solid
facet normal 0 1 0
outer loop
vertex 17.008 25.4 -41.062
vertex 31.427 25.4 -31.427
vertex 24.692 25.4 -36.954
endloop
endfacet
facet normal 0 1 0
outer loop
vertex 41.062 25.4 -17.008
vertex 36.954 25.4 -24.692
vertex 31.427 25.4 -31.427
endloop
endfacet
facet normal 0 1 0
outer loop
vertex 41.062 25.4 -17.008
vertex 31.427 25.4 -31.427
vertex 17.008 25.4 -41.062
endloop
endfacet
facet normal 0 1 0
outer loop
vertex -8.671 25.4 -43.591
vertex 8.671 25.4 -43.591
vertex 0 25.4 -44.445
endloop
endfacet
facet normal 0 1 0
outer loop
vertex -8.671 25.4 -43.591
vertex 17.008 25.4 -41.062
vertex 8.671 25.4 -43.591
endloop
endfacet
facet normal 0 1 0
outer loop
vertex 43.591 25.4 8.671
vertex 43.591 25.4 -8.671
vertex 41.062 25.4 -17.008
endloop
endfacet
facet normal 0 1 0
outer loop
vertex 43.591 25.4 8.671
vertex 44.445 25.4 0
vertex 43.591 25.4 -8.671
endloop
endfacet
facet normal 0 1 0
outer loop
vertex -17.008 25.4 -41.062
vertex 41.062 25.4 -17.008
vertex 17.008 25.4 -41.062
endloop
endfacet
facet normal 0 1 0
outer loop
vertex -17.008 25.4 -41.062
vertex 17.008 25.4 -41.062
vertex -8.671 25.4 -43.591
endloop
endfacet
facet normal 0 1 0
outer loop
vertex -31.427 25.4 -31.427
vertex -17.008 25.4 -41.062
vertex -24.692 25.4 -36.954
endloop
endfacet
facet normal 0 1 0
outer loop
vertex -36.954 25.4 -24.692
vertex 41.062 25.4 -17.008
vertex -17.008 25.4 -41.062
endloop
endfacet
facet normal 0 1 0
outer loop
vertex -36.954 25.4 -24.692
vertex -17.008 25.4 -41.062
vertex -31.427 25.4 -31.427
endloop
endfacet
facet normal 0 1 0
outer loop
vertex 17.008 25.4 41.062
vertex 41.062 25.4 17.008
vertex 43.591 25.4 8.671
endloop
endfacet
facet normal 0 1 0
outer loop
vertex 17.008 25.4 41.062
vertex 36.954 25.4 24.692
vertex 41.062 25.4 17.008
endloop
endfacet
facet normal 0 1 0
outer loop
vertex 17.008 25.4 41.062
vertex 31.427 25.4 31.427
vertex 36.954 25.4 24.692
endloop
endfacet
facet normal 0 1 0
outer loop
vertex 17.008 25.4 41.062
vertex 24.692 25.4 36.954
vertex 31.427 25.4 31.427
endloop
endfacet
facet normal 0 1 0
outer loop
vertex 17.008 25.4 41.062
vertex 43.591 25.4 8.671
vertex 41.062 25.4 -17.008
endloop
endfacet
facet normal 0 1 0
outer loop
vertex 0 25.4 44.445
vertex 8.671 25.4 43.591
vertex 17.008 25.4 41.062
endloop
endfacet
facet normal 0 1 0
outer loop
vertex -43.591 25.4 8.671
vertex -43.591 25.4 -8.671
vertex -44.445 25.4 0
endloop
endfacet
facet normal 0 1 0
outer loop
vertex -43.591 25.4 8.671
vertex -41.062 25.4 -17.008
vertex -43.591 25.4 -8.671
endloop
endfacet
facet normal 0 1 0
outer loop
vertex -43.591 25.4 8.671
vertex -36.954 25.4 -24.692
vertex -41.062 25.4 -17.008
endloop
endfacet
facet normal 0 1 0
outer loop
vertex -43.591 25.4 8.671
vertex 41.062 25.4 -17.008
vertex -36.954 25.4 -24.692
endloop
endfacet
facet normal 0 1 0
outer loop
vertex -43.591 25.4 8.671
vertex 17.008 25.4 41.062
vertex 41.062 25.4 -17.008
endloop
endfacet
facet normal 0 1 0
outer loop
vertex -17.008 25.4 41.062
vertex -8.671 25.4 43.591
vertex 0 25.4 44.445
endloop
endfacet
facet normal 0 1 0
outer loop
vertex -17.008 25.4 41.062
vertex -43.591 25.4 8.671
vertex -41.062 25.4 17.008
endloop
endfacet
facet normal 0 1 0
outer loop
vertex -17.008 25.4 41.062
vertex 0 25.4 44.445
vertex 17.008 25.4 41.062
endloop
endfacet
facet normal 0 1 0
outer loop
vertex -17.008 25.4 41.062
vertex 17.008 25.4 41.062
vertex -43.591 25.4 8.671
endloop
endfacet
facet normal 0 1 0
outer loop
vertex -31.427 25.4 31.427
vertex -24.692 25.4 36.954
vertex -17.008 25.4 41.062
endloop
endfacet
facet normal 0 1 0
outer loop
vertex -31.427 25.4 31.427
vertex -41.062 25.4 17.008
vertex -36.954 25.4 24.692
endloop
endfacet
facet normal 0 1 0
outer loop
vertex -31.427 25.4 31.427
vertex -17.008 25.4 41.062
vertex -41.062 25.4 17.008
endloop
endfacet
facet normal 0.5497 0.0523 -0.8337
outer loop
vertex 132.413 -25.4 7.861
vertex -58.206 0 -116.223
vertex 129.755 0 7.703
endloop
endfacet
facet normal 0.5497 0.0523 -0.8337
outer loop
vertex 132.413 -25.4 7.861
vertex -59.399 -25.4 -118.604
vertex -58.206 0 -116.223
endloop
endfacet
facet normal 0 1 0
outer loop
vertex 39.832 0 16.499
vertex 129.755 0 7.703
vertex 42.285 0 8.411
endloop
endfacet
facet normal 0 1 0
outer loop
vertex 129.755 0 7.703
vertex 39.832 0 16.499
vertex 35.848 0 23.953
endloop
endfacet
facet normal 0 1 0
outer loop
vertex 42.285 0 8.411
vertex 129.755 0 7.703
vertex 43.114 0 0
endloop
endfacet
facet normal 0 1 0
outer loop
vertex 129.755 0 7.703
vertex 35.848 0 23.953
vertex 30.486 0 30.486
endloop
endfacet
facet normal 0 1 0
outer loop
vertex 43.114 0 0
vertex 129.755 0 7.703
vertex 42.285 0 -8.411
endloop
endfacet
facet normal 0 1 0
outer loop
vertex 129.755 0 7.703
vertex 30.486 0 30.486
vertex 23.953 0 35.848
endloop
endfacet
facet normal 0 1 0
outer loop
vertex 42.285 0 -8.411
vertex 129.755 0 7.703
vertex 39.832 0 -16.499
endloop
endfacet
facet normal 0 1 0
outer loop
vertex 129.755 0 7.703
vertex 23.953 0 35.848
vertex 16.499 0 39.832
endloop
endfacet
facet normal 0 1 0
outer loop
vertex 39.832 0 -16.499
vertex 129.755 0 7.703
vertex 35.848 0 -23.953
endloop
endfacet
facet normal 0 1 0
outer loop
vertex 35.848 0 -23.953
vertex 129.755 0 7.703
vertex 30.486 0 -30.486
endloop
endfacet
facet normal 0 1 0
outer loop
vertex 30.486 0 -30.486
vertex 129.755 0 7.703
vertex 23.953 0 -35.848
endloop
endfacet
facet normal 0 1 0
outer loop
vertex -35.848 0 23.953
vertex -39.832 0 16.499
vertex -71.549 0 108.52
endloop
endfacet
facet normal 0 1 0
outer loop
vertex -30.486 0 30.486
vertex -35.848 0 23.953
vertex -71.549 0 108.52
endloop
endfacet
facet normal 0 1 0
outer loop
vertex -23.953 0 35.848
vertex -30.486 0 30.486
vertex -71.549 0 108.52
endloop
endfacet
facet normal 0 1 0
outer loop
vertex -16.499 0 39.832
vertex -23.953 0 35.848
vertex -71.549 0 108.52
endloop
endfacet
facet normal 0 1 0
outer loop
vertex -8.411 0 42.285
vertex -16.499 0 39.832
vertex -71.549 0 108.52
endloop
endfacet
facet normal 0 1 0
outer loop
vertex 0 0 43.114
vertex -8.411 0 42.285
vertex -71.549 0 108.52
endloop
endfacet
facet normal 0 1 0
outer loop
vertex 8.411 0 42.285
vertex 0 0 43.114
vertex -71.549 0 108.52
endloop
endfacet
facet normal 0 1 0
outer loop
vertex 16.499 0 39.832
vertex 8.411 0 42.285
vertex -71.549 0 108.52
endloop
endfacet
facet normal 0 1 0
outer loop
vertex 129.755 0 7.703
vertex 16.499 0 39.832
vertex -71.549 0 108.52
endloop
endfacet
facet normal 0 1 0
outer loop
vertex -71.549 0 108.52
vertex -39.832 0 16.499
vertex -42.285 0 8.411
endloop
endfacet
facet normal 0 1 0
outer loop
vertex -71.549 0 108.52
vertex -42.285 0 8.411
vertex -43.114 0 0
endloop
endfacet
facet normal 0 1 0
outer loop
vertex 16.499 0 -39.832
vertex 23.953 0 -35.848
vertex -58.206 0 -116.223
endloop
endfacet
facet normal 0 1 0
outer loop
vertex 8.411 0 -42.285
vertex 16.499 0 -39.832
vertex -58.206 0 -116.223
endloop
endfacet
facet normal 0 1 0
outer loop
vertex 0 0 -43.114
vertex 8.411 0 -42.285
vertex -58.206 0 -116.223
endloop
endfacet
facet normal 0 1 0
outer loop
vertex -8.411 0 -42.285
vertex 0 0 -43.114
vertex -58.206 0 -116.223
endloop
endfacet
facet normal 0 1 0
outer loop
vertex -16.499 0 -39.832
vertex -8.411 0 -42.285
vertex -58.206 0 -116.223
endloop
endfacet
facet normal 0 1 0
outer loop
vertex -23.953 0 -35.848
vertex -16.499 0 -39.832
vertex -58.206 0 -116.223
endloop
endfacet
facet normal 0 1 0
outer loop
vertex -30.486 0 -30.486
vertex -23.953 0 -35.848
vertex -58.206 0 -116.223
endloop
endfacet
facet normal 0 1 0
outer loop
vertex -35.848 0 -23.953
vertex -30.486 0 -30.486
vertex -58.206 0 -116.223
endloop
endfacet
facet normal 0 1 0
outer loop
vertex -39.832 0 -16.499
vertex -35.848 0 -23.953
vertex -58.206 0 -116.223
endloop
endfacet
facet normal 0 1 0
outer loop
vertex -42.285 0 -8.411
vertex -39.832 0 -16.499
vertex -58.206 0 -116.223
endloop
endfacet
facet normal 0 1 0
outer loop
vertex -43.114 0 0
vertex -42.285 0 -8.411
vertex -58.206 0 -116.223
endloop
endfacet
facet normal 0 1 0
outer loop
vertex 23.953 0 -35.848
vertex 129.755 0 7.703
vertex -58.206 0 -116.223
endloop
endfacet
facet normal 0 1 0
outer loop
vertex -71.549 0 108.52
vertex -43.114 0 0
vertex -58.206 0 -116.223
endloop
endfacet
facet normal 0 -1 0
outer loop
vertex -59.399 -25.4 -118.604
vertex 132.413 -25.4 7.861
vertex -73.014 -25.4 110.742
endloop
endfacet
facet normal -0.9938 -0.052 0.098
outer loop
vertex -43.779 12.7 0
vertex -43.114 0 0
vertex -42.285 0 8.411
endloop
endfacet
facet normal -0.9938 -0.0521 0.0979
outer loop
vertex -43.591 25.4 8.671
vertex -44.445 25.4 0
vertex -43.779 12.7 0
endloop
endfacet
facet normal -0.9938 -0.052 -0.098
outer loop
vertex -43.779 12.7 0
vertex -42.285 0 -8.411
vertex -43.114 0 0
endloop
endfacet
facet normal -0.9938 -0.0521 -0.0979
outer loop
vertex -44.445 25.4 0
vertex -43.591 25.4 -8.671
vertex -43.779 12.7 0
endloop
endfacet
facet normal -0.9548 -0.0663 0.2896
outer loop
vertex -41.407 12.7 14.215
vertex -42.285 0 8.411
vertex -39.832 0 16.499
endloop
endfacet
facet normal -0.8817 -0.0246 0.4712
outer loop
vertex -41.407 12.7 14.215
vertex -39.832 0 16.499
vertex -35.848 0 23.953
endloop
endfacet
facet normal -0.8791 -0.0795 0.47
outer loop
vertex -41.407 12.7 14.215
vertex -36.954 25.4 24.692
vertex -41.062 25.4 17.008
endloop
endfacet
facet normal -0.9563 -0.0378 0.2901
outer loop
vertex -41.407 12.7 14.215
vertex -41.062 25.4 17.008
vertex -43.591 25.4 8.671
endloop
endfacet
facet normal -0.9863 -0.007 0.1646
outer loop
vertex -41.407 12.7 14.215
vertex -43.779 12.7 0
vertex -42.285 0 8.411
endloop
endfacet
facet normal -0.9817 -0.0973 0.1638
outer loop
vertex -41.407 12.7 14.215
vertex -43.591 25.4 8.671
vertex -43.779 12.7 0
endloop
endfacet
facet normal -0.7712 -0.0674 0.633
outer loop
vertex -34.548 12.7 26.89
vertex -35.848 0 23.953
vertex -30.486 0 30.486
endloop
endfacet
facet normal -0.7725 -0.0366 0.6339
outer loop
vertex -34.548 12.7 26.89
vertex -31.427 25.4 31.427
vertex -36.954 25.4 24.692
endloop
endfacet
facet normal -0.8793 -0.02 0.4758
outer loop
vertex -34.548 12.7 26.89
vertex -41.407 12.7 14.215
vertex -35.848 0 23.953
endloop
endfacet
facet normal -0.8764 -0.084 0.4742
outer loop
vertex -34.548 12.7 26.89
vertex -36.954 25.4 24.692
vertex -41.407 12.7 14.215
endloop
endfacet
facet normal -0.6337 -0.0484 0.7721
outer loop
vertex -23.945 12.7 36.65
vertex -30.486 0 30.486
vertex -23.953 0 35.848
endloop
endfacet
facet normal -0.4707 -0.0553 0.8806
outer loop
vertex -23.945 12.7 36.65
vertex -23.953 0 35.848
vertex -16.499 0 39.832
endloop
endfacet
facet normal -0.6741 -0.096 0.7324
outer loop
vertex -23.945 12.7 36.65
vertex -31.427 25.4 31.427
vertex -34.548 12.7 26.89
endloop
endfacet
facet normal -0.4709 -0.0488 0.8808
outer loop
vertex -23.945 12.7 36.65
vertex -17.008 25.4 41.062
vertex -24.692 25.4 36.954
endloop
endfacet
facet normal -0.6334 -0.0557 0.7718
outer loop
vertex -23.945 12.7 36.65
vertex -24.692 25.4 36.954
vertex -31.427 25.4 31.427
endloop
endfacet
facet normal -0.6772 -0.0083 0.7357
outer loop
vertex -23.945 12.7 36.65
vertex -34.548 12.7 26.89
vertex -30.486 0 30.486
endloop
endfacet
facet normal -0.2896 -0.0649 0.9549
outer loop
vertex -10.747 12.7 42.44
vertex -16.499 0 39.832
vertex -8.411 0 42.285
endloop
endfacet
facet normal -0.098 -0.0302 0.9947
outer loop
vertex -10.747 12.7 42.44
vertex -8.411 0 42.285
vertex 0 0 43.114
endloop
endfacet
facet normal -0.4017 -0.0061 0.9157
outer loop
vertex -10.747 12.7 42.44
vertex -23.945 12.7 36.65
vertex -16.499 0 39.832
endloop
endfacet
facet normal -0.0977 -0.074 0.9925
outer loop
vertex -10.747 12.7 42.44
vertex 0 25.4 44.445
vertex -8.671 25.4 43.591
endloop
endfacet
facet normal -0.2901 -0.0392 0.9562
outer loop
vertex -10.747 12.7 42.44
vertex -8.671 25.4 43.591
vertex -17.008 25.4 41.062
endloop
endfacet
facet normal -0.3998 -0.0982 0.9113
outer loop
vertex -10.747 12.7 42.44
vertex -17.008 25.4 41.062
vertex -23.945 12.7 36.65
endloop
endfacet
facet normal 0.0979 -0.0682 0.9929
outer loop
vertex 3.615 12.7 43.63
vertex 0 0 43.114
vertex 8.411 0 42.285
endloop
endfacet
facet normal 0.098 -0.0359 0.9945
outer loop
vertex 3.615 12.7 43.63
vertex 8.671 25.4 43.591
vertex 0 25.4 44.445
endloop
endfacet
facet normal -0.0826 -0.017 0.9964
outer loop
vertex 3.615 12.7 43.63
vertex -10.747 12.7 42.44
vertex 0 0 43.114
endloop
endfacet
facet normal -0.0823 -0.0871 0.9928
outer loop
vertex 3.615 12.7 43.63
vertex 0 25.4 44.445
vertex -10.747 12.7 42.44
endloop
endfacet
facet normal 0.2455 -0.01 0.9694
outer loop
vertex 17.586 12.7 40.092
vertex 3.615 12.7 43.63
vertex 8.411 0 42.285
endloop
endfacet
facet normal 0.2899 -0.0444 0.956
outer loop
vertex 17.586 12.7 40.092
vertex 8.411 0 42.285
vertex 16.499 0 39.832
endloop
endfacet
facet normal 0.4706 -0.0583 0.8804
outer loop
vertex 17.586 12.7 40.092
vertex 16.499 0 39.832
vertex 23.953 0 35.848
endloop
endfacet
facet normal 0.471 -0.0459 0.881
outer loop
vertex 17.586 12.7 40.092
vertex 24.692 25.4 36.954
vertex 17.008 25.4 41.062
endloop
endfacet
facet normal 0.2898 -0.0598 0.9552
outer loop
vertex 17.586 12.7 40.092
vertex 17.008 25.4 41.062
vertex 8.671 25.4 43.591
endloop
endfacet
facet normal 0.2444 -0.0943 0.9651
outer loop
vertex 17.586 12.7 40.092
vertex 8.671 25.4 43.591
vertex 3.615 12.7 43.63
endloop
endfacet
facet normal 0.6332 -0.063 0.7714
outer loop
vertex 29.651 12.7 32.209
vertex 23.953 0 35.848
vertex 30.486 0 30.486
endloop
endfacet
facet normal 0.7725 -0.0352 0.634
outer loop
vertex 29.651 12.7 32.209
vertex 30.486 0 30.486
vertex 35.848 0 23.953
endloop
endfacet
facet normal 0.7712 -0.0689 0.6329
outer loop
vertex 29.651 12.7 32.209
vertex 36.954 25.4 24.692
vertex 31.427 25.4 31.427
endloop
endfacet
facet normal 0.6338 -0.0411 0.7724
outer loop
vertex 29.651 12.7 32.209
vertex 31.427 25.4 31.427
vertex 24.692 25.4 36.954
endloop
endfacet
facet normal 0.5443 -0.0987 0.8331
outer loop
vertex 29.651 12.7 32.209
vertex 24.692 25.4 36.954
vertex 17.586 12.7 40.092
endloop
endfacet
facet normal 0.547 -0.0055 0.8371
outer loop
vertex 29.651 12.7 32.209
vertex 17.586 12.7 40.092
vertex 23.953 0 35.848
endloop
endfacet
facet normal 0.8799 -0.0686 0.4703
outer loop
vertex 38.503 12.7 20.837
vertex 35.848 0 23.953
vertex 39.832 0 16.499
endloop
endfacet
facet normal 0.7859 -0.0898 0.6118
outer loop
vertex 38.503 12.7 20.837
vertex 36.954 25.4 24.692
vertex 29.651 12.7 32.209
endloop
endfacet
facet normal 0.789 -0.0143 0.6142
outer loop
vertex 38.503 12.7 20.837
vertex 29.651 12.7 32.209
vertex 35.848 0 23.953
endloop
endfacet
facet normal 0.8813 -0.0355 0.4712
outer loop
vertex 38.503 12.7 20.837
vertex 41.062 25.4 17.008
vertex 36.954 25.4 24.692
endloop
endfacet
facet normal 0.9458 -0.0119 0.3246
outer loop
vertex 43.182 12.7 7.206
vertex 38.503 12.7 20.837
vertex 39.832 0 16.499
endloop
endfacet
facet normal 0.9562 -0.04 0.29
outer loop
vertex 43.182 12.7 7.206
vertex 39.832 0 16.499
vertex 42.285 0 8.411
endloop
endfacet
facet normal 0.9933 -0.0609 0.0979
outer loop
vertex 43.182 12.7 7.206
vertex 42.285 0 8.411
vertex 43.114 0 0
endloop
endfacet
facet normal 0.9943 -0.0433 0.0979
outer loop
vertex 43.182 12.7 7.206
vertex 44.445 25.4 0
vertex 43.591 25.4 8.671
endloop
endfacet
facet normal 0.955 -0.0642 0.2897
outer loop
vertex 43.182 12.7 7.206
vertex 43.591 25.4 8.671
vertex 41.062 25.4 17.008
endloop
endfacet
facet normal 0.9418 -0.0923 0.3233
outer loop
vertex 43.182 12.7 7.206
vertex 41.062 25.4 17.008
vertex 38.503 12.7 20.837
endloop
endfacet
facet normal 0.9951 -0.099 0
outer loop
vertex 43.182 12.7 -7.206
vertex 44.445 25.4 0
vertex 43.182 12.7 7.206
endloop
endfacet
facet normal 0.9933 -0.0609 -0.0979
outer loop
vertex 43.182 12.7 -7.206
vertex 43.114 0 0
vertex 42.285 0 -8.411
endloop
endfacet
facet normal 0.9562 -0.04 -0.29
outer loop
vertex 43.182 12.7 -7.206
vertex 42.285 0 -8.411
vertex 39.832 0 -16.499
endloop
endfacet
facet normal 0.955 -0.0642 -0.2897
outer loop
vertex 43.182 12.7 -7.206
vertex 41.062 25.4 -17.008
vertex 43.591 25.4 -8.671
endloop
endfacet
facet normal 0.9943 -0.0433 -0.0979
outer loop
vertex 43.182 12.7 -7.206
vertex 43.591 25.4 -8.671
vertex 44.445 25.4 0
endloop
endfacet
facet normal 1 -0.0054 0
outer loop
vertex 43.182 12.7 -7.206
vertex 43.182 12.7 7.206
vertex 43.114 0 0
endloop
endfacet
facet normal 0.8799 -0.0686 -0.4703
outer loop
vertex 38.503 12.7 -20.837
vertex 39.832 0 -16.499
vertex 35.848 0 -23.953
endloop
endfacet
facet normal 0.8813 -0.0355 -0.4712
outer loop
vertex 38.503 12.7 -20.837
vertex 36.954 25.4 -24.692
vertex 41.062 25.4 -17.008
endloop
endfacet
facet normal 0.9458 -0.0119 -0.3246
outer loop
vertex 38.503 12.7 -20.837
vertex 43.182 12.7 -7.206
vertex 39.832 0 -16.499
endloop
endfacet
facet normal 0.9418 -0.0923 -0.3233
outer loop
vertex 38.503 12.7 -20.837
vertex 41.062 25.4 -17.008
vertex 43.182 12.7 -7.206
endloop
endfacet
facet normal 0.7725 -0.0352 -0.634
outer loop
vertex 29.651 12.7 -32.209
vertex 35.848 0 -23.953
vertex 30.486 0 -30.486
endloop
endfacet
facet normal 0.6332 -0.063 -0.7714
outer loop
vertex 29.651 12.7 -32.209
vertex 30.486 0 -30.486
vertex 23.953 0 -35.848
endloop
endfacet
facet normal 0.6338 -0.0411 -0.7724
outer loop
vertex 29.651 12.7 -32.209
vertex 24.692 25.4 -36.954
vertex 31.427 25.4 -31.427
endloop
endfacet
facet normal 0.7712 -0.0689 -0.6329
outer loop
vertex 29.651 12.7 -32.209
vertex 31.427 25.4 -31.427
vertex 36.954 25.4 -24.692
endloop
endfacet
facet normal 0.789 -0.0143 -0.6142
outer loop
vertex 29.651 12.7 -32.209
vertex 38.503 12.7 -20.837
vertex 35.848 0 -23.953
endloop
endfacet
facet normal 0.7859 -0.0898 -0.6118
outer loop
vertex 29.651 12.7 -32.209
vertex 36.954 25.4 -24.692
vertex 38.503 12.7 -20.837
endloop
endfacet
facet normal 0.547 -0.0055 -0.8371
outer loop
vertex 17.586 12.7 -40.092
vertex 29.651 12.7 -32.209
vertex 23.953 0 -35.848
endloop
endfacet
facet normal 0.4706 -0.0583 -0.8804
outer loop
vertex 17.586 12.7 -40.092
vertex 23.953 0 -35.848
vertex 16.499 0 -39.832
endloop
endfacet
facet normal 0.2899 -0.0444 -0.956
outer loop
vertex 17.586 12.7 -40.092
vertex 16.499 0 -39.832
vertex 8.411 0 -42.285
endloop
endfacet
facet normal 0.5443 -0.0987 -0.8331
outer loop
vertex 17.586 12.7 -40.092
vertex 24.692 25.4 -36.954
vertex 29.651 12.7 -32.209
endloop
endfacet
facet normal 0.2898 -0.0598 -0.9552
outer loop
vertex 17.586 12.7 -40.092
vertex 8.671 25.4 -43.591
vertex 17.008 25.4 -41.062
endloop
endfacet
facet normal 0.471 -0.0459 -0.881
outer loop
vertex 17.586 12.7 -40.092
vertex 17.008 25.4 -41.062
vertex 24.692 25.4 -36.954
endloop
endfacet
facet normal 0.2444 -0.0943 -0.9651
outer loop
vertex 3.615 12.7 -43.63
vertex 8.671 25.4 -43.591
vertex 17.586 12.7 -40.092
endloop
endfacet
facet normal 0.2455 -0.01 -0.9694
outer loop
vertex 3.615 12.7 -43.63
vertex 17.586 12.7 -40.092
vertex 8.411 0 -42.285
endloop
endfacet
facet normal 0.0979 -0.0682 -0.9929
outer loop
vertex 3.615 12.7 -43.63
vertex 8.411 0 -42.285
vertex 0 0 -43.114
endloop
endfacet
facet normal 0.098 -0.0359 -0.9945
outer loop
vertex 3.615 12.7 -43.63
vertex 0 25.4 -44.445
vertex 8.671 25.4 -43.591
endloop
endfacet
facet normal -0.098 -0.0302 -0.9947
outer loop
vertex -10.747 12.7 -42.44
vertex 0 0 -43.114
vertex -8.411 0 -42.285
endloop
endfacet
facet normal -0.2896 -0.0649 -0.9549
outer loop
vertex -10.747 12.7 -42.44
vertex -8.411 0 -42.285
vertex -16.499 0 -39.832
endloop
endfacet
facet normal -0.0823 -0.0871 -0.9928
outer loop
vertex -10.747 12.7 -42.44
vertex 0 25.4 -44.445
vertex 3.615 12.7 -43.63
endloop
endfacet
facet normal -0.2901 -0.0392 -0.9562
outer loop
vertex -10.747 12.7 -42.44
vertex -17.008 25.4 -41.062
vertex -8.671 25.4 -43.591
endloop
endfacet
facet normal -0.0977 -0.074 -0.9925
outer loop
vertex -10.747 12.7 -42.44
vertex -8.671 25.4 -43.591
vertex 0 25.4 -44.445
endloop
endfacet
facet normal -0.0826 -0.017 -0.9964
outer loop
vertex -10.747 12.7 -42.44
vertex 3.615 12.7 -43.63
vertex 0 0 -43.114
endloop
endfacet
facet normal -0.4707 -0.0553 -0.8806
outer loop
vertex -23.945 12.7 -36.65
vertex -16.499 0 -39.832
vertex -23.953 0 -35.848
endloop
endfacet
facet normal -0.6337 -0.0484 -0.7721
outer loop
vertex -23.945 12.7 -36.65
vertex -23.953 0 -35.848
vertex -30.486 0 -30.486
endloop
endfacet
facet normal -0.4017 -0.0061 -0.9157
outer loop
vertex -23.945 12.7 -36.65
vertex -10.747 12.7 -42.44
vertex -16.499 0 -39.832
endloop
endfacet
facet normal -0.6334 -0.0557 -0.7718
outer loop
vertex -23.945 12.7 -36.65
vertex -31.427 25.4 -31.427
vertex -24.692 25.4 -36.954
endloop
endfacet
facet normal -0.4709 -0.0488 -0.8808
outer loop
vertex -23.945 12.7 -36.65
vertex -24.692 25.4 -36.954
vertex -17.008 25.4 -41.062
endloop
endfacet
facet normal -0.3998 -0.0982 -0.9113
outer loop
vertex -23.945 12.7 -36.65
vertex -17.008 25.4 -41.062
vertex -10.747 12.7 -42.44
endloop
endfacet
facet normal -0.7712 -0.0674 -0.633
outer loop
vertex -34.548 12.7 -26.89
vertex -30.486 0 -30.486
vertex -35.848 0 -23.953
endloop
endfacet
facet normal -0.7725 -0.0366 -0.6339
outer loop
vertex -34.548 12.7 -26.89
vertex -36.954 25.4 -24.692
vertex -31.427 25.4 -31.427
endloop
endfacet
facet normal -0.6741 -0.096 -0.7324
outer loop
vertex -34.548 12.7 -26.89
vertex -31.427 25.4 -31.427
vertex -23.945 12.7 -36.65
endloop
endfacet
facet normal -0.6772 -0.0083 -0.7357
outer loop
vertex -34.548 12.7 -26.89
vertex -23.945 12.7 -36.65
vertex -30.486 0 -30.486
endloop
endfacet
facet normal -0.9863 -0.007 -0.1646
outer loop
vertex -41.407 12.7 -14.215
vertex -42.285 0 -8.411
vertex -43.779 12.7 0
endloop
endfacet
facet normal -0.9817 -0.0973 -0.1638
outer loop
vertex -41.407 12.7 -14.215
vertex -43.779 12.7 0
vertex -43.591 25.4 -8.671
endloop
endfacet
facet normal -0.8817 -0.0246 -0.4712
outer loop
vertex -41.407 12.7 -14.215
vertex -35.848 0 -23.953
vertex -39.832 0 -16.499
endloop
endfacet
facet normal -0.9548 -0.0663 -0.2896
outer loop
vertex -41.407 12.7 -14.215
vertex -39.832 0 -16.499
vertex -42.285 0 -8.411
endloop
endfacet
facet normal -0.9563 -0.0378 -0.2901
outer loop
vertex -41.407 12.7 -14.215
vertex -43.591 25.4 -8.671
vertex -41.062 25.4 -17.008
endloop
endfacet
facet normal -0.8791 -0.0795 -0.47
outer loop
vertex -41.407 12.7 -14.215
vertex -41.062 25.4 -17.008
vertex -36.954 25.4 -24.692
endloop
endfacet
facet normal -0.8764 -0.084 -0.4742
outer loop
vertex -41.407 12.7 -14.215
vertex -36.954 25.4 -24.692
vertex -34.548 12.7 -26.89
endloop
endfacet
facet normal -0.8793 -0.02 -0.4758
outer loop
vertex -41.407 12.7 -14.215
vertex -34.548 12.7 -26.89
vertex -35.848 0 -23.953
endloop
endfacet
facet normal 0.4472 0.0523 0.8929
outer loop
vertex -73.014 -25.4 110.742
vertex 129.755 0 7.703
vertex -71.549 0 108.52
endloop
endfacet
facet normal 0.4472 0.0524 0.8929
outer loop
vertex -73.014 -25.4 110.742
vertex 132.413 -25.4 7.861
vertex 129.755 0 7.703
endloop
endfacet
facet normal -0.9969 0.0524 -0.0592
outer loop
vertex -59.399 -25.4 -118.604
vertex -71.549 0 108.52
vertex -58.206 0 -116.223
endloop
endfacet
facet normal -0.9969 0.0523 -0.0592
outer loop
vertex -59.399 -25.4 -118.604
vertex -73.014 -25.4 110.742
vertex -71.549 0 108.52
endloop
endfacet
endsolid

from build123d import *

# Parameters (mm, degrees)
F1_DEPTH = 25.4
F1_TAPER = -3
F2_R     = 43.1135543891
F3_DEPTH = 25.4
F3_TAPER = -3
F4_R     = 16.6756638842
F5_DEPTH = 25.4
F5_TAPER = -3


with BuildPart() as f1:
    # F0 (on Front) → F1 (new body)
    with BuildSketch(Plane.XZ):
        Polygon((129.7552857443, 7.7033717296), (-71.5489584847, 108.5196878651), (-58.2063272595, -116.2230595946), align=None)
    extrude(amount=F1_DEPTH, taper=F1_TAPER)

    # F2 (on face) → F3 (join)
    with BuildSketch(Plane(origin=(0, 0, 0), x_dir=(-1, 0, 0), z_dir=(0, 1, 0))):
        Circle(F2_R)
    extrude(amount=F3_DEPTH, taper=F3_TAPER)

    # F4 (on face) → F5 (join)
    with BuildSketch(Plane(origin=(0, 0, 0), x_dir=(-1, 0, 0), z_dir=(0, 1, 0))):
        Circle(F4_R)
    extrude(amount=F5_DEPTH, taper=F5_TAPER)


solid = f1.part
